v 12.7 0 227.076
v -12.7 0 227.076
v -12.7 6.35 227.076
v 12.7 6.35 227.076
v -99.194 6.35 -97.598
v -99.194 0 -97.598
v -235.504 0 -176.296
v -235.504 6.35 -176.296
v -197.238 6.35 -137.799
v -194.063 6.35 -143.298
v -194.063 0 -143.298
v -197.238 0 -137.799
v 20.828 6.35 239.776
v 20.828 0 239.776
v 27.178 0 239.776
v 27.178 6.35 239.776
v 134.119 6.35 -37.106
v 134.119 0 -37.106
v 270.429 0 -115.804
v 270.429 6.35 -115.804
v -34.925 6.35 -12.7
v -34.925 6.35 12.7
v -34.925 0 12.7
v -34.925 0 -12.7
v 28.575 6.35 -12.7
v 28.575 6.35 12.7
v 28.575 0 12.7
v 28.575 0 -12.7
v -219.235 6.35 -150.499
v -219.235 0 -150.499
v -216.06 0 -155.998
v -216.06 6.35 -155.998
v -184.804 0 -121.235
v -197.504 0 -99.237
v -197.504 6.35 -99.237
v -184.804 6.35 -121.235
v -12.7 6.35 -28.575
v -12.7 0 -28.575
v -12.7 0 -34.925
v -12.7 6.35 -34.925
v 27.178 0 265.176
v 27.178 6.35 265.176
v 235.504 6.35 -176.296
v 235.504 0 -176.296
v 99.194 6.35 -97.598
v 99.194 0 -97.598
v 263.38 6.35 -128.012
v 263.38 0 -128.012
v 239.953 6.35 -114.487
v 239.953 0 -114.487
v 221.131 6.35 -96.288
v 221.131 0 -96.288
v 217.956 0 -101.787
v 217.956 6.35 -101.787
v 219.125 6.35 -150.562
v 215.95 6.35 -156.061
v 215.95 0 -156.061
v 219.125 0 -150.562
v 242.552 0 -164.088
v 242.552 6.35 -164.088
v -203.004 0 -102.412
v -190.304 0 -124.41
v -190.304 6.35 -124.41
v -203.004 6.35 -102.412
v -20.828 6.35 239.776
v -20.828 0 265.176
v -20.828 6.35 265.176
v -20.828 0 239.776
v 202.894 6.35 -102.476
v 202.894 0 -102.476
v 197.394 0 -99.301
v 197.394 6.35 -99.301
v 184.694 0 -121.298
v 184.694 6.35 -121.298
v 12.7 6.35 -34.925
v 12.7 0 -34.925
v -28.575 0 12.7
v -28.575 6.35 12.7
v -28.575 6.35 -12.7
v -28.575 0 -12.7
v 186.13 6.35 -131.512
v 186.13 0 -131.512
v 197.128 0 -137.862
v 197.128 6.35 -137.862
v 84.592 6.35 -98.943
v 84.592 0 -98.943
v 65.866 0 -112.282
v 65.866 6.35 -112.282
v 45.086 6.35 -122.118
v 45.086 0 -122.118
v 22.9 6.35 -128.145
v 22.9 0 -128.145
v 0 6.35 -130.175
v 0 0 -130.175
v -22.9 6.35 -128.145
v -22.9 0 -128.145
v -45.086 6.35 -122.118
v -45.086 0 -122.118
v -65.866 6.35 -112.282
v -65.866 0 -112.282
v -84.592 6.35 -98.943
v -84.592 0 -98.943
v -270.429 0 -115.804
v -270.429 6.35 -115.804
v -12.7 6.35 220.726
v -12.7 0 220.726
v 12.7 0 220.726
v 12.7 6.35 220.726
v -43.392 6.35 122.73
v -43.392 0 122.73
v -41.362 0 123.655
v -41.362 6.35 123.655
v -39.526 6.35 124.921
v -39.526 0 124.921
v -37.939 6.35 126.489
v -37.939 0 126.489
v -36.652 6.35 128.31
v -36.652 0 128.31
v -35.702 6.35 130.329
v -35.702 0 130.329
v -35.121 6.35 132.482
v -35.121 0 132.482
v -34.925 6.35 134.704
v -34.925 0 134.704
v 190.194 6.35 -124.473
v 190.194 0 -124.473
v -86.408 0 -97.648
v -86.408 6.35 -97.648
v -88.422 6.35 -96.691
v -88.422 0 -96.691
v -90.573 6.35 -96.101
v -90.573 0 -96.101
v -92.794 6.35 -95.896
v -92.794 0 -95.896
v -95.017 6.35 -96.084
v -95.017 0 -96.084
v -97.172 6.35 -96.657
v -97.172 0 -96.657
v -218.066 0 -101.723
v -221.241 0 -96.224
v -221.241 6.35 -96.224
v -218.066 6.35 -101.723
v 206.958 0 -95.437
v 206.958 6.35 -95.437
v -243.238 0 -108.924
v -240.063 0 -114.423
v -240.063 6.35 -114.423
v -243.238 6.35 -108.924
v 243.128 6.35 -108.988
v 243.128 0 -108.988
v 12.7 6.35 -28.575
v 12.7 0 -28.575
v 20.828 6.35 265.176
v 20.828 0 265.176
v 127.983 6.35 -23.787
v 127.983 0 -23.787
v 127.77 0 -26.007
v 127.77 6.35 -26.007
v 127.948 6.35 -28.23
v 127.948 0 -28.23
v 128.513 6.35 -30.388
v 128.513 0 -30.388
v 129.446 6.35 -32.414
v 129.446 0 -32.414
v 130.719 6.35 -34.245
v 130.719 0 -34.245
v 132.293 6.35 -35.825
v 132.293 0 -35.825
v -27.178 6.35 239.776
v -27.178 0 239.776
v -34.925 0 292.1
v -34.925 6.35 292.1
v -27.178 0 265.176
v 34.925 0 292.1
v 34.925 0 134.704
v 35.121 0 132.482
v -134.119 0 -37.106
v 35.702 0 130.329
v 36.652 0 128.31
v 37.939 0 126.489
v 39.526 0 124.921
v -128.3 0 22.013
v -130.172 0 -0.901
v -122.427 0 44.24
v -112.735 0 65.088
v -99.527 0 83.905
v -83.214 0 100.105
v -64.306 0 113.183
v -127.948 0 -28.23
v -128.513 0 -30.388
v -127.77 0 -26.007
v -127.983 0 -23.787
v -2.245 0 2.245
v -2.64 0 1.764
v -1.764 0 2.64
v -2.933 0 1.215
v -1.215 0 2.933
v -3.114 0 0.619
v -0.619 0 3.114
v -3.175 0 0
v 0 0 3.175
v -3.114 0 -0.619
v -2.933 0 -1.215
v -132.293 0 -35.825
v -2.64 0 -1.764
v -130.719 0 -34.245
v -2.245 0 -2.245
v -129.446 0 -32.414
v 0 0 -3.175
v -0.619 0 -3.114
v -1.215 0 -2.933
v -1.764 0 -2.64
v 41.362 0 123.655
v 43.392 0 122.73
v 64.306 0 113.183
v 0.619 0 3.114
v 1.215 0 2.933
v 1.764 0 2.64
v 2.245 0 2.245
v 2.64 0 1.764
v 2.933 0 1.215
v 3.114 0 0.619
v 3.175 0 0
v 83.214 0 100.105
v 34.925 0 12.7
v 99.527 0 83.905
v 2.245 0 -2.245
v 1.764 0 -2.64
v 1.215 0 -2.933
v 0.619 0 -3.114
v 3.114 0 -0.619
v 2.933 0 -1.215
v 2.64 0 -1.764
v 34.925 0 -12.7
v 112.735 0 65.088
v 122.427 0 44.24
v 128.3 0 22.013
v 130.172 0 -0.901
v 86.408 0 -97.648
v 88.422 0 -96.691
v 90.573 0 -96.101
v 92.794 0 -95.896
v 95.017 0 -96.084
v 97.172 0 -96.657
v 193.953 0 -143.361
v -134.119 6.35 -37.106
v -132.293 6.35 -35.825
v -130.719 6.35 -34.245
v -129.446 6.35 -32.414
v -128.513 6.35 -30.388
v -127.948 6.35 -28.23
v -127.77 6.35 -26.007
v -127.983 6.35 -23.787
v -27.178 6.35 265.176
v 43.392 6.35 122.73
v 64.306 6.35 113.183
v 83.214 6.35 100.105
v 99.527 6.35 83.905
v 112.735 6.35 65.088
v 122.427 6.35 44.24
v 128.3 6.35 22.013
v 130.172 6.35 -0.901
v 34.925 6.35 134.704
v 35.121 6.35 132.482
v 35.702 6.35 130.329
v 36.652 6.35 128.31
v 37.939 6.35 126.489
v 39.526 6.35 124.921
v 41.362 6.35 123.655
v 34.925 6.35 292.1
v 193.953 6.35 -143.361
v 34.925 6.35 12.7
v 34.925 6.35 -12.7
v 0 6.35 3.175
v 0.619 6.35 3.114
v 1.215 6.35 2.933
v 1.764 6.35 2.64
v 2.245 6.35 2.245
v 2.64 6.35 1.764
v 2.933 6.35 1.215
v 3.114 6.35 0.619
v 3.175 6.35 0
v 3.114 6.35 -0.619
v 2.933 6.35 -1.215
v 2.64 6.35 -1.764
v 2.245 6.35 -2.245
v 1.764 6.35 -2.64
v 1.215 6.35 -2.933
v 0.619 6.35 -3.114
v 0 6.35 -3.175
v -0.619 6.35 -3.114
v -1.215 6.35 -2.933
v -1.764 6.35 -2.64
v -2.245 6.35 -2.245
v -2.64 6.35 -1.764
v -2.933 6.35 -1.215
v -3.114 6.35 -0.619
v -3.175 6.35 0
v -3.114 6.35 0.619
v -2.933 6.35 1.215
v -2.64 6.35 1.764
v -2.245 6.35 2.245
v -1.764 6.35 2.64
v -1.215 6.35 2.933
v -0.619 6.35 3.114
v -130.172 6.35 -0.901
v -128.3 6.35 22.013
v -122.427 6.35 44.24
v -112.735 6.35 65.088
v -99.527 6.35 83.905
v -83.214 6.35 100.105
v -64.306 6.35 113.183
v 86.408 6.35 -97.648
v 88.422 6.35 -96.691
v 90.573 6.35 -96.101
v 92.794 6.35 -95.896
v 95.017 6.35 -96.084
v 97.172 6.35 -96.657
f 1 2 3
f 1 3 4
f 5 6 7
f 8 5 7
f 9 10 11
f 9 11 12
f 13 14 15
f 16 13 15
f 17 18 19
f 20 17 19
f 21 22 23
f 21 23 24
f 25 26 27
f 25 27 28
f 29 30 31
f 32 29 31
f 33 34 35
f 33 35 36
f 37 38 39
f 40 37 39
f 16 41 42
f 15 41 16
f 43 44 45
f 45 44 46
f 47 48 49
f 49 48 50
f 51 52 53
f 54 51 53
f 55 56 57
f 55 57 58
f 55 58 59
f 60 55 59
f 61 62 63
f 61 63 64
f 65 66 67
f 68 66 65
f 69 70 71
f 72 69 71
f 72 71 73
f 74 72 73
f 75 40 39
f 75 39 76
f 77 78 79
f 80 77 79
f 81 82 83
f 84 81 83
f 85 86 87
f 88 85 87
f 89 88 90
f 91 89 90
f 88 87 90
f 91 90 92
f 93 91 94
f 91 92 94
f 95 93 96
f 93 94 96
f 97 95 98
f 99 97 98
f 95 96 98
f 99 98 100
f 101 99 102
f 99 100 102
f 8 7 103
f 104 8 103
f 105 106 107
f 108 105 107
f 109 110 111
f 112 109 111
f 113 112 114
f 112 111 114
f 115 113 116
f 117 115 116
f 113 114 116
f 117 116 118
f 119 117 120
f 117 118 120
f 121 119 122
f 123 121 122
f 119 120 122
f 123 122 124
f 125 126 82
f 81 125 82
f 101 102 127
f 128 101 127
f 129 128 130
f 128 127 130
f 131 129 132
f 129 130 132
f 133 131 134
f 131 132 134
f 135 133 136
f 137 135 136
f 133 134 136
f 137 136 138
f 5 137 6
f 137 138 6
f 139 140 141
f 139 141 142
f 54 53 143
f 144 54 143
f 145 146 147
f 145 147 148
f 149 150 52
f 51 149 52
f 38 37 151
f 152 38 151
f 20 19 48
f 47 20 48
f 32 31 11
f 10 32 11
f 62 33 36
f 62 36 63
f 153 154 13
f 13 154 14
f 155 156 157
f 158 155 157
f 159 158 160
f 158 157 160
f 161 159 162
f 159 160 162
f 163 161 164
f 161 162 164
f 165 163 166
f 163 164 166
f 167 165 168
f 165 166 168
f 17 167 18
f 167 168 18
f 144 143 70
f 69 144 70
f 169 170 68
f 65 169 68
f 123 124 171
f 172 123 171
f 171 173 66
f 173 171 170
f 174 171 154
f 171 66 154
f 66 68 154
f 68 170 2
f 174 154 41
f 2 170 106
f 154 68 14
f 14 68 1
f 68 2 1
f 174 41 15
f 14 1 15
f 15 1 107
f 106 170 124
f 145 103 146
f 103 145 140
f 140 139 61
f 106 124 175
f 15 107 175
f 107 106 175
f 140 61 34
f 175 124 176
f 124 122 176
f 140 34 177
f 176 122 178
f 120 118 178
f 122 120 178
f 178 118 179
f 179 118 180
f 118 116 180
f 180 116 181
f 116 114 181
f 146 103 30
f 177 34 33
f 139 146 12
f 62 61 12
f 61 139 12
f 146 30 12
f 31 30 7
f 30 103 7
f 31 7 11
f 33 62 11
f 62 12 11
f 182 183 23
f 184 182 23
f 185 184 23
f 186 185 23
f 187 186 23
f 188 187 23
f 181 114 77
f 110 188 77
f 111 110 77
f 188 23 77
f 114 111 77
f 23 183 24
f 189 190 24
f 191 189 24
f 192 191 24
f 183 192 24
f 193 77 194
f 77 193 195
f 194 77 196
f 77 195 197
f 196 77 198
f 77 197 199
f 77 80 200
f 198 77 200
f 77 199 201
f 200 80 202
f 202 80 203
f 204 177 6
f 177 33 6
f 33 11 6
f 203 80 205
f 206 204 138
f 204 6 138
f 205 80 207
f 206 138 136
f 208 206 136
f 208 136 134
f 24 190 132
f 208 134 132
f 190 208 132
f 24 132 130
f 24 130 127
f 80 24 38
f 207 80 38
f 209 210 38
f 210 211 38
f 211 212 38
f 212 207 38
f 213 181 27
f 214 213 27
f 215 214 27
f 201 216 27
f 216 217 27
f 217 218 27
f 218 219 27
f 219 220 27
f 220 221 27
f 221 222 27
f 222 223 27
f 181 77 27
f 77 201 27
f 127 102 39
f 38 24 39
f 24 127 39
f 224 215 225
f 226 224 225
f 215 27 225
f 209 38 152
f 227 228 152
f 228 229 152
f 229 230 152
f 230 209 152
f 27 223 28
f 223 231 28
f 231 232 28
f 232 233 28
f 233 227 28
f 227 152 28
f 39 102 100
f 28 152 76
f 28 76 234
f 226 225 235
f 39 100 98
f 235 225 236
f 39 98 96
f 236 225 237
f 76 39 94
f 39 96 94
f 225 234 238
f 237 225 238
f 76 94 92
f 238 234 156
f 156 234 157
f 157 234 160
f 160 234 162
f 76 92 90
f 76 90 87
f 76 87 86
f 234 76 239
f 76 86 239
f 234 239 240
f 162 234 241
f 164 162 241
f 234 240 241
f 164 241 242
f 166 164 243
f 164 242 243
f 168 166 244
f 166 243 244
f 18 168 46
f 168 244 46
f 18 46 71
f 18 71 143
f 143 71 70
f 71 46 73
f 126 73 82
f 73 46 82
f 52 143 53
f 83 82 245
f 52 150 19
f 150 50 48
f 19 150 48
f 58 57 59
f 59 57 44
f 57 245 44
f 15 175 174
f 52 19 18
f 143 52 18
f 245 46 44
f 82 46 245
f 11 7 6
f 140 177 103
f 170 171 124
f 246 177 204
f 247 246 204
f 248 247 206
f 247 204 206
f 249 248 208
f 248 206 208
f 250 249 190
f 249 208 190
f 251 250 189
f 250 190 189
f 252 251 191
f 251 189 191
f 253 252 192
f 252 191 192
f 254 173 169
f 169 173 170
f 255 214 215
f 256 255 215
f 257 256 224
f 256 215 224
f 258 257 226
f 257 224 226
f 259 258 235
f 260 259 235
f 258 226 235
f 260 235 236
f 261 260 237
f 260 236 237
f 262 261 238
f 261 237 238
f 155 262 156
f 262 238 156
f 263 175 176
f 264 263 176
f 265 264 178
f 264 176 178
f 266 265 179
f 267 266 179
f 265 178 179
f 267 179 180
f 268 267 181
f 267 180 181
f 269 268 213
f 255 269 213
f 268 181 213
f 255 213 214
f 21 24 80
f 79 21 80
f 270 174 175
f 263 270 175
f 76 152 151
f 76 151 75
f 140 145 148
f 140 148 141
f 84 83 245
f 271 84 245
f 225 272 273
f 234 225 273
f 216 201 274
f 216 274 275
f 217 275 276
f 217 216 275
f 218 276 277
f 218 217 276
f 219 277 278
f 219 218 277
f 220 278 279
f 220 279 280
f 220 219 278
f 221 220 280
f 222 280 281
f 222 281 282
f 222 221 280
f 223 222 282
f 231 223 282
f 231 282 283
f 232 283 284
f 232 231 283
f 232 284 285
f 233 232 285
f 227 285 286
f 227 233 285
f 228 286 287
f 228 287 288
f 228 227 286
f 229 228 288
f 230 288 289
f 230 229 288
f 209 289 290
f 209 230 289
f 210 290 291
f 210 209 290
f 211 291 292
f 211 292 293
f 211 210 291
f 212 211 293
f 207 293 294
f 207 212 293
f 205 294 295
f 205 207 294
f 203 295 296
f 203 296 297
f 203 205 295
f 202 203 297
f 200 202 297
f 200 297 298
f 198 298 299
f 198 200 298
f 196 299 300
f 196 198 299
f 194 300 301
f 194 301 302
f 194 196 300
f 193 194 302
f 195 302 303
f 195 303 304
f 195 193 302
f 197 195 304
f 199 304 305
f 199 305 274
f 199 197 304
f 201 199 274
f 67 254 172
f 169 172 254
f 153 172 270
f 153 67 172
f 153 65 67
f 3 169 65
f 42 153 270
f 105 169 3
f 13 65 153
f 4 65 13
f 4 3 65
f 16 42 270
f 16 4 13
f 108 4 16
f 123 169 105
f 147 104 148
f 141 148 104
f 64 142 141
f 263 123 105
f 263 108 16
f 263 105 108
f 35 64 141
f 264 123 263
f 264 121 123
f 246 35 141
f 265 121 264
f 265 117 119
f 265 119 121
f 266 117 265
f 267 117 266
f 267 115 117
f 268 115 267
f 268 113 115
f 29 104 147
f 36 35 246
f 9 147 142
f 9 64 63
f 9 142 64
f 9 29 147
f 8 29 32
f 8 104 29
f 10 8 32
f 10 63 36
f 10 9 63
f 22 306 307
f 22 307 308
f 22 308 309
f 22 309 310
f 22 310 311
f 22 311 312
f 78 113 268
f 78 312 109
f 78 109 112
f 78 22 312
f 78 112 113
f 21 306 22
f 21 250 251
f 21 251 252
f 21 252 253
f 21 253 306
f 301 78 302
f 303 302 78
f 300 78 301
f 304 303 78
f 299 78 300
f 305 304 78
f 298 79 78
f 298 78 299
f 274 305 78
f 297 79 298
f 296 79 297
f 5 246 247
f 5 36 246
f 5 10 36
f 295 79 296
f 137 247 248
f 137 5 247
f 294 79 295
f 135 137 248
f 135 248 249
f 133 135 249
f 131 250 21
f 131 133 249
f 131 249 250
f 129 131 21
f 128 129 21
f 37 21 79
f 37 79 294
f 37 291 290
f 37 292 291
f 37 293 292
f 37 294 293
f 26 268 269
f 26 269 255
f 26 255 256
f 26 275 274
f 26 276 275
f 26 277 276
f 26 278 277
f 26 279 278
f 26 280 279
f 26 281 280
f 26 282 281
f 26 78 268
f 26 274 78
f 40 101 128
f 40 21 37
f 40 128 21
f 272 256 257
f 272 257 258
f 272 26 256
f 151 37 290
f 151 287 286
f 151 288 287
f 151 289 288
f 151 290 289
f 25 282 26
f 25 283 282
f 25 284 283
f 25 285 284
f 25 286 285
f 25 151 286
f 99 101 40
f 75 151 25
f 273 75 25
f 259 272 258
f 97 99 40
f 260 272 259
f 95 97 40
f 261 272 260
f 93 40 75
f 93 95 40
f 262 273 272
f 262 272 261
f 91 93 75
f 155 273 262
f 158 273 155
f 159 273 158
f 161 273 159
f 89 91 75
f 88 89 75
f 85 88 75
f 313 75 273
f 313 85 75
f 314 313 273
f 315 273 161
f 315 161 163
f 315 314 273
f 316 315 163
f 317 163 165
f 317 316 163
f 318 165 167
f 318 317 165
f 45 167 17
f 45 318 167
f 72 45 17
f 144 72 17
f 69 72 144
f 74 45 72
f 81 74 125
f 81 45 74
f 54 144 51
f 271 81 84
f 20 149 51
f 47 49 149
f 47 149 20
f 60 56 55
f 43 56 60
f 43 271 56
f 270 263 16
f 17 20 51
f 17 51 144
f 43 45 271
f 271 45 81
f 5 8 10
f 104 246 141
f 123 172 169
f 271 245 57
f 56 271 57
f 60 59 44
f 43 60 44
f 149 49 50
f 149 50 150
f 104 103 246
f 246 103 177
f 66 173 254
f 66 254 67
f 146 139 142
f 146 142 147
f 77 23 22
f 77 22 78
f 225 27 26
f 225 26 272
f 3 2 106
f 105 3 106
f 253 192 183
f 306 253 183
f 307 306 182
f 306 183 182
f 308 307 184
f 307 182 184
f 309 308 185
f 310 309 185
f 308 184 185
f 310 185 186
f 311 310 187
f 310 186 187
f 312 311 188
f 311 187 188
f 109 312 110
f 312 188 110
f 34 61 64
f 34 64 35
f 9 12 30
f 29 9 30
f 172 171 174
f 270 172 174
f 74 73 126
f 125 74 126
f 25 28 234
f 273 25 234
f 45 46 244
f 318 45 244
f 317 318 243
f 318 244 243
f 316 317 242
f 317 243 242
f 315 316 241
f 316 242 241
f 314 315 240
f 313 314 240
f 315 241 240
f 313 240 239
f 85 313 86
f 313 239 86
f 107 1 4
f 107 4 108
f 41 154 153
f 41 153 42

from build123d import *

# Parameters (mm, degrees)
SKETCH1_R      = 3.175
SKETCH1_W      = 25.4
SKETCH1_H      = 6.35
SKETCH1_W_2    = 6.35
SKETCH1_H_2    = 25.4
EXTRUDE2_DEPTH = 6.35
SKETCH2_W      = 6.35
SKETCH2_H      = 25.4
SKETCH2_W_2    = 25.4
SKETCH2_H_2    = 6.35
EXTRUDE4_DEPTH = 399.113447613


with BuildPart() as part:
    # Sketch1 → Extrude2 (new body)
    with BuildSketch(Plane(origin=(0, 0, 0), x_dir=(1, 0, 0), z_dir=(0, 1, 0))):
        with BuildLine():
            Line((-34.925, -292.1), (34.925, -292.1))
            Line((34.925, -292.1), (34.925, -134.703841816))
            ThreePointArc((34.925, -134.703841816), (37.255493422, -127.371493397), (43.391666667, -122.730166988))
            ThreePointArc((43.391666667, -122.730166988), (112.734856938, -65.0875), (127.983275756, 23.786797848))
            ThreePointArc((127.983275756, 23.786797848), (128.934695711, 31.421542964), (134.119449, 37.105983681))
            Line((134.119449, 37.105983681), (270.428520445, 115.804062773))
            Line((270.428520445, 115.804062773), (263.380020445, 128.01242289))
            Line((263.380020445, 128.01242289), (239.953167248, 114.48692289))
            Line((239.953167248, 114.48692289), (243.128167248, 108.987661576))
            Line((243.128167248, 108.987661576), (221.131121992, 96.287661576))
            Line((221.131121992, 96.287661576), (217.956121992, 101.78692289))
            Line((217.956121992, 101.78692289), (206.957599363, 95.43692289))
            Line((206.957599363, 95.43692289), (202.893599363, 102.475977372))
            Line((202.893599363, 102.475977372), (197.394338049, 99.300977372))
            Line((197.394338049, 99.300977372), (184.694338049, 121.298022628))
            Line((184.694338049, 121.298022628), (190.193599363, 124.473022628))
            Line((190.193599363, 124.473022628), (186.129599363, 131.51207711))
            Line((186.129599363, 131.51207711), (197.128121992, 137.86207711))
            Line((197.128121992, 137.86207711), (193.953121992, 143.361338424))
            Line((193.953121992, 143.361338424), (215.950167248, 156.061338424))
            Line((215.950167248, 156.061338424), (219.125167248, 150.56207711))
            Line((219.125167248, 150.56207711), (242.552020445, 164.08757711))
            Line((242.552020445, 164.08757711), (235.503520445, 176.295937227))
            Line((235.503520445, 176.295937227), (99.194449, 97.597858135))
            ThreePointArc((99.194449, 97.597858135), (91.679202289, 95.949950433), (84.591609089, 98.94336914))
            ThreePointArc((84.591609089, 98.94336914), (0, 130.175), (-84.591609089, 98.94336914))
            ThreePointArc((-84.591609089, 98.94336914), (-91.679202289, 95.949950433), (-99.194449, 97.597858135))
            Line((-99.194449, 97.597858135), (-235.503520445, 176.295937227))
            Line((-235.503520445, 176.295937227), (-270.428520445, 115.804062773))
            Line((-270.428520445, 115.804062773), (-134.119449, 37.105983681))
            ThreePointArc((-134.119449, 37.105983681), (-128.934695711, 31.421542964), (-127.983275756, 23.786797848))
            ThreePointArc((-127.983275756, 23.786797848), (-112.734856938, -65.0875), (-43.391666667, -122.730166988))
            ThreePointArc((-43.391666667, -122.730166988), (-37.255493422, -127.371493397), (-34.925, -134.703841816))
            Line((-34.925, -134.703841816), (-34.925, -292.1))
        make_face()
        with Locations(Location((0, 0, 0), (0, 0, 270))):
            Circle(SKETCH1_R, mode=Mode.SUBTRACT)
        with Locations((0, -223.901)):
            Rectangle(SKETCH1_W, SKETCH1_H, mode=Mode.SUBTRACT)
        with Locations((-24.003, -252.476)):
            Rectangle(SKETCH1_W_2, SKETCH1_H_2, mode=Mode.SUBTRACT)
        with Locations((24.003, -252.476)):
            Rectangle(SKETCH1_W_2, SKETCH1_H_2, mode=Mode.SUBTRACT)
        Polygon((-197.504323276, 99.237477372), (-184.804323276, 121.234522628), (-190.30358459, 124.409522628), (-203.00358459, 102.412477372), align=None, mode=Mode.SUBTRACT)
        Polygon((-194.063107218, 143.297838424), (-197.238107218, 137.79857711), (-219.235152474, 150.49857711), (-216.060152474, 155.997838424), align=None, mode=Mode.SUBTRACT)
        Polygon((-240.063152474, 114.42342289), (-243.238152474, 108.924161576), (-221.241107218, 96.224161576), (-218.066107218, 101.72342289), align=None, mode=Mode.SUBTRACT)
    extrude(amount=EXTRUDE2_DEPTH)

    # Sketch2 → Extrude4 (cut, through all)
    with BuildSketch(Plane(origin=(0, 6.35, 0), x_dir=(1, 0, 0), z_dir=(0, 1, 0))):
        with Locations((-31.75, 0)):
            Rectangle(SKETCH2_W, SKETCH2_H)
        with Locations((0, 31.75)):
            Rectangle(SKETCH2_W_2, SKETCH2_H_2)
        with Locations((31.75, 0)):
            Rectangle(SKETCH2_W, SKETCH2_H)
    extrude(amount=-EXTRUDE4_DEPTH, mode=Mode.SUBTRACT)


solid = part.part
